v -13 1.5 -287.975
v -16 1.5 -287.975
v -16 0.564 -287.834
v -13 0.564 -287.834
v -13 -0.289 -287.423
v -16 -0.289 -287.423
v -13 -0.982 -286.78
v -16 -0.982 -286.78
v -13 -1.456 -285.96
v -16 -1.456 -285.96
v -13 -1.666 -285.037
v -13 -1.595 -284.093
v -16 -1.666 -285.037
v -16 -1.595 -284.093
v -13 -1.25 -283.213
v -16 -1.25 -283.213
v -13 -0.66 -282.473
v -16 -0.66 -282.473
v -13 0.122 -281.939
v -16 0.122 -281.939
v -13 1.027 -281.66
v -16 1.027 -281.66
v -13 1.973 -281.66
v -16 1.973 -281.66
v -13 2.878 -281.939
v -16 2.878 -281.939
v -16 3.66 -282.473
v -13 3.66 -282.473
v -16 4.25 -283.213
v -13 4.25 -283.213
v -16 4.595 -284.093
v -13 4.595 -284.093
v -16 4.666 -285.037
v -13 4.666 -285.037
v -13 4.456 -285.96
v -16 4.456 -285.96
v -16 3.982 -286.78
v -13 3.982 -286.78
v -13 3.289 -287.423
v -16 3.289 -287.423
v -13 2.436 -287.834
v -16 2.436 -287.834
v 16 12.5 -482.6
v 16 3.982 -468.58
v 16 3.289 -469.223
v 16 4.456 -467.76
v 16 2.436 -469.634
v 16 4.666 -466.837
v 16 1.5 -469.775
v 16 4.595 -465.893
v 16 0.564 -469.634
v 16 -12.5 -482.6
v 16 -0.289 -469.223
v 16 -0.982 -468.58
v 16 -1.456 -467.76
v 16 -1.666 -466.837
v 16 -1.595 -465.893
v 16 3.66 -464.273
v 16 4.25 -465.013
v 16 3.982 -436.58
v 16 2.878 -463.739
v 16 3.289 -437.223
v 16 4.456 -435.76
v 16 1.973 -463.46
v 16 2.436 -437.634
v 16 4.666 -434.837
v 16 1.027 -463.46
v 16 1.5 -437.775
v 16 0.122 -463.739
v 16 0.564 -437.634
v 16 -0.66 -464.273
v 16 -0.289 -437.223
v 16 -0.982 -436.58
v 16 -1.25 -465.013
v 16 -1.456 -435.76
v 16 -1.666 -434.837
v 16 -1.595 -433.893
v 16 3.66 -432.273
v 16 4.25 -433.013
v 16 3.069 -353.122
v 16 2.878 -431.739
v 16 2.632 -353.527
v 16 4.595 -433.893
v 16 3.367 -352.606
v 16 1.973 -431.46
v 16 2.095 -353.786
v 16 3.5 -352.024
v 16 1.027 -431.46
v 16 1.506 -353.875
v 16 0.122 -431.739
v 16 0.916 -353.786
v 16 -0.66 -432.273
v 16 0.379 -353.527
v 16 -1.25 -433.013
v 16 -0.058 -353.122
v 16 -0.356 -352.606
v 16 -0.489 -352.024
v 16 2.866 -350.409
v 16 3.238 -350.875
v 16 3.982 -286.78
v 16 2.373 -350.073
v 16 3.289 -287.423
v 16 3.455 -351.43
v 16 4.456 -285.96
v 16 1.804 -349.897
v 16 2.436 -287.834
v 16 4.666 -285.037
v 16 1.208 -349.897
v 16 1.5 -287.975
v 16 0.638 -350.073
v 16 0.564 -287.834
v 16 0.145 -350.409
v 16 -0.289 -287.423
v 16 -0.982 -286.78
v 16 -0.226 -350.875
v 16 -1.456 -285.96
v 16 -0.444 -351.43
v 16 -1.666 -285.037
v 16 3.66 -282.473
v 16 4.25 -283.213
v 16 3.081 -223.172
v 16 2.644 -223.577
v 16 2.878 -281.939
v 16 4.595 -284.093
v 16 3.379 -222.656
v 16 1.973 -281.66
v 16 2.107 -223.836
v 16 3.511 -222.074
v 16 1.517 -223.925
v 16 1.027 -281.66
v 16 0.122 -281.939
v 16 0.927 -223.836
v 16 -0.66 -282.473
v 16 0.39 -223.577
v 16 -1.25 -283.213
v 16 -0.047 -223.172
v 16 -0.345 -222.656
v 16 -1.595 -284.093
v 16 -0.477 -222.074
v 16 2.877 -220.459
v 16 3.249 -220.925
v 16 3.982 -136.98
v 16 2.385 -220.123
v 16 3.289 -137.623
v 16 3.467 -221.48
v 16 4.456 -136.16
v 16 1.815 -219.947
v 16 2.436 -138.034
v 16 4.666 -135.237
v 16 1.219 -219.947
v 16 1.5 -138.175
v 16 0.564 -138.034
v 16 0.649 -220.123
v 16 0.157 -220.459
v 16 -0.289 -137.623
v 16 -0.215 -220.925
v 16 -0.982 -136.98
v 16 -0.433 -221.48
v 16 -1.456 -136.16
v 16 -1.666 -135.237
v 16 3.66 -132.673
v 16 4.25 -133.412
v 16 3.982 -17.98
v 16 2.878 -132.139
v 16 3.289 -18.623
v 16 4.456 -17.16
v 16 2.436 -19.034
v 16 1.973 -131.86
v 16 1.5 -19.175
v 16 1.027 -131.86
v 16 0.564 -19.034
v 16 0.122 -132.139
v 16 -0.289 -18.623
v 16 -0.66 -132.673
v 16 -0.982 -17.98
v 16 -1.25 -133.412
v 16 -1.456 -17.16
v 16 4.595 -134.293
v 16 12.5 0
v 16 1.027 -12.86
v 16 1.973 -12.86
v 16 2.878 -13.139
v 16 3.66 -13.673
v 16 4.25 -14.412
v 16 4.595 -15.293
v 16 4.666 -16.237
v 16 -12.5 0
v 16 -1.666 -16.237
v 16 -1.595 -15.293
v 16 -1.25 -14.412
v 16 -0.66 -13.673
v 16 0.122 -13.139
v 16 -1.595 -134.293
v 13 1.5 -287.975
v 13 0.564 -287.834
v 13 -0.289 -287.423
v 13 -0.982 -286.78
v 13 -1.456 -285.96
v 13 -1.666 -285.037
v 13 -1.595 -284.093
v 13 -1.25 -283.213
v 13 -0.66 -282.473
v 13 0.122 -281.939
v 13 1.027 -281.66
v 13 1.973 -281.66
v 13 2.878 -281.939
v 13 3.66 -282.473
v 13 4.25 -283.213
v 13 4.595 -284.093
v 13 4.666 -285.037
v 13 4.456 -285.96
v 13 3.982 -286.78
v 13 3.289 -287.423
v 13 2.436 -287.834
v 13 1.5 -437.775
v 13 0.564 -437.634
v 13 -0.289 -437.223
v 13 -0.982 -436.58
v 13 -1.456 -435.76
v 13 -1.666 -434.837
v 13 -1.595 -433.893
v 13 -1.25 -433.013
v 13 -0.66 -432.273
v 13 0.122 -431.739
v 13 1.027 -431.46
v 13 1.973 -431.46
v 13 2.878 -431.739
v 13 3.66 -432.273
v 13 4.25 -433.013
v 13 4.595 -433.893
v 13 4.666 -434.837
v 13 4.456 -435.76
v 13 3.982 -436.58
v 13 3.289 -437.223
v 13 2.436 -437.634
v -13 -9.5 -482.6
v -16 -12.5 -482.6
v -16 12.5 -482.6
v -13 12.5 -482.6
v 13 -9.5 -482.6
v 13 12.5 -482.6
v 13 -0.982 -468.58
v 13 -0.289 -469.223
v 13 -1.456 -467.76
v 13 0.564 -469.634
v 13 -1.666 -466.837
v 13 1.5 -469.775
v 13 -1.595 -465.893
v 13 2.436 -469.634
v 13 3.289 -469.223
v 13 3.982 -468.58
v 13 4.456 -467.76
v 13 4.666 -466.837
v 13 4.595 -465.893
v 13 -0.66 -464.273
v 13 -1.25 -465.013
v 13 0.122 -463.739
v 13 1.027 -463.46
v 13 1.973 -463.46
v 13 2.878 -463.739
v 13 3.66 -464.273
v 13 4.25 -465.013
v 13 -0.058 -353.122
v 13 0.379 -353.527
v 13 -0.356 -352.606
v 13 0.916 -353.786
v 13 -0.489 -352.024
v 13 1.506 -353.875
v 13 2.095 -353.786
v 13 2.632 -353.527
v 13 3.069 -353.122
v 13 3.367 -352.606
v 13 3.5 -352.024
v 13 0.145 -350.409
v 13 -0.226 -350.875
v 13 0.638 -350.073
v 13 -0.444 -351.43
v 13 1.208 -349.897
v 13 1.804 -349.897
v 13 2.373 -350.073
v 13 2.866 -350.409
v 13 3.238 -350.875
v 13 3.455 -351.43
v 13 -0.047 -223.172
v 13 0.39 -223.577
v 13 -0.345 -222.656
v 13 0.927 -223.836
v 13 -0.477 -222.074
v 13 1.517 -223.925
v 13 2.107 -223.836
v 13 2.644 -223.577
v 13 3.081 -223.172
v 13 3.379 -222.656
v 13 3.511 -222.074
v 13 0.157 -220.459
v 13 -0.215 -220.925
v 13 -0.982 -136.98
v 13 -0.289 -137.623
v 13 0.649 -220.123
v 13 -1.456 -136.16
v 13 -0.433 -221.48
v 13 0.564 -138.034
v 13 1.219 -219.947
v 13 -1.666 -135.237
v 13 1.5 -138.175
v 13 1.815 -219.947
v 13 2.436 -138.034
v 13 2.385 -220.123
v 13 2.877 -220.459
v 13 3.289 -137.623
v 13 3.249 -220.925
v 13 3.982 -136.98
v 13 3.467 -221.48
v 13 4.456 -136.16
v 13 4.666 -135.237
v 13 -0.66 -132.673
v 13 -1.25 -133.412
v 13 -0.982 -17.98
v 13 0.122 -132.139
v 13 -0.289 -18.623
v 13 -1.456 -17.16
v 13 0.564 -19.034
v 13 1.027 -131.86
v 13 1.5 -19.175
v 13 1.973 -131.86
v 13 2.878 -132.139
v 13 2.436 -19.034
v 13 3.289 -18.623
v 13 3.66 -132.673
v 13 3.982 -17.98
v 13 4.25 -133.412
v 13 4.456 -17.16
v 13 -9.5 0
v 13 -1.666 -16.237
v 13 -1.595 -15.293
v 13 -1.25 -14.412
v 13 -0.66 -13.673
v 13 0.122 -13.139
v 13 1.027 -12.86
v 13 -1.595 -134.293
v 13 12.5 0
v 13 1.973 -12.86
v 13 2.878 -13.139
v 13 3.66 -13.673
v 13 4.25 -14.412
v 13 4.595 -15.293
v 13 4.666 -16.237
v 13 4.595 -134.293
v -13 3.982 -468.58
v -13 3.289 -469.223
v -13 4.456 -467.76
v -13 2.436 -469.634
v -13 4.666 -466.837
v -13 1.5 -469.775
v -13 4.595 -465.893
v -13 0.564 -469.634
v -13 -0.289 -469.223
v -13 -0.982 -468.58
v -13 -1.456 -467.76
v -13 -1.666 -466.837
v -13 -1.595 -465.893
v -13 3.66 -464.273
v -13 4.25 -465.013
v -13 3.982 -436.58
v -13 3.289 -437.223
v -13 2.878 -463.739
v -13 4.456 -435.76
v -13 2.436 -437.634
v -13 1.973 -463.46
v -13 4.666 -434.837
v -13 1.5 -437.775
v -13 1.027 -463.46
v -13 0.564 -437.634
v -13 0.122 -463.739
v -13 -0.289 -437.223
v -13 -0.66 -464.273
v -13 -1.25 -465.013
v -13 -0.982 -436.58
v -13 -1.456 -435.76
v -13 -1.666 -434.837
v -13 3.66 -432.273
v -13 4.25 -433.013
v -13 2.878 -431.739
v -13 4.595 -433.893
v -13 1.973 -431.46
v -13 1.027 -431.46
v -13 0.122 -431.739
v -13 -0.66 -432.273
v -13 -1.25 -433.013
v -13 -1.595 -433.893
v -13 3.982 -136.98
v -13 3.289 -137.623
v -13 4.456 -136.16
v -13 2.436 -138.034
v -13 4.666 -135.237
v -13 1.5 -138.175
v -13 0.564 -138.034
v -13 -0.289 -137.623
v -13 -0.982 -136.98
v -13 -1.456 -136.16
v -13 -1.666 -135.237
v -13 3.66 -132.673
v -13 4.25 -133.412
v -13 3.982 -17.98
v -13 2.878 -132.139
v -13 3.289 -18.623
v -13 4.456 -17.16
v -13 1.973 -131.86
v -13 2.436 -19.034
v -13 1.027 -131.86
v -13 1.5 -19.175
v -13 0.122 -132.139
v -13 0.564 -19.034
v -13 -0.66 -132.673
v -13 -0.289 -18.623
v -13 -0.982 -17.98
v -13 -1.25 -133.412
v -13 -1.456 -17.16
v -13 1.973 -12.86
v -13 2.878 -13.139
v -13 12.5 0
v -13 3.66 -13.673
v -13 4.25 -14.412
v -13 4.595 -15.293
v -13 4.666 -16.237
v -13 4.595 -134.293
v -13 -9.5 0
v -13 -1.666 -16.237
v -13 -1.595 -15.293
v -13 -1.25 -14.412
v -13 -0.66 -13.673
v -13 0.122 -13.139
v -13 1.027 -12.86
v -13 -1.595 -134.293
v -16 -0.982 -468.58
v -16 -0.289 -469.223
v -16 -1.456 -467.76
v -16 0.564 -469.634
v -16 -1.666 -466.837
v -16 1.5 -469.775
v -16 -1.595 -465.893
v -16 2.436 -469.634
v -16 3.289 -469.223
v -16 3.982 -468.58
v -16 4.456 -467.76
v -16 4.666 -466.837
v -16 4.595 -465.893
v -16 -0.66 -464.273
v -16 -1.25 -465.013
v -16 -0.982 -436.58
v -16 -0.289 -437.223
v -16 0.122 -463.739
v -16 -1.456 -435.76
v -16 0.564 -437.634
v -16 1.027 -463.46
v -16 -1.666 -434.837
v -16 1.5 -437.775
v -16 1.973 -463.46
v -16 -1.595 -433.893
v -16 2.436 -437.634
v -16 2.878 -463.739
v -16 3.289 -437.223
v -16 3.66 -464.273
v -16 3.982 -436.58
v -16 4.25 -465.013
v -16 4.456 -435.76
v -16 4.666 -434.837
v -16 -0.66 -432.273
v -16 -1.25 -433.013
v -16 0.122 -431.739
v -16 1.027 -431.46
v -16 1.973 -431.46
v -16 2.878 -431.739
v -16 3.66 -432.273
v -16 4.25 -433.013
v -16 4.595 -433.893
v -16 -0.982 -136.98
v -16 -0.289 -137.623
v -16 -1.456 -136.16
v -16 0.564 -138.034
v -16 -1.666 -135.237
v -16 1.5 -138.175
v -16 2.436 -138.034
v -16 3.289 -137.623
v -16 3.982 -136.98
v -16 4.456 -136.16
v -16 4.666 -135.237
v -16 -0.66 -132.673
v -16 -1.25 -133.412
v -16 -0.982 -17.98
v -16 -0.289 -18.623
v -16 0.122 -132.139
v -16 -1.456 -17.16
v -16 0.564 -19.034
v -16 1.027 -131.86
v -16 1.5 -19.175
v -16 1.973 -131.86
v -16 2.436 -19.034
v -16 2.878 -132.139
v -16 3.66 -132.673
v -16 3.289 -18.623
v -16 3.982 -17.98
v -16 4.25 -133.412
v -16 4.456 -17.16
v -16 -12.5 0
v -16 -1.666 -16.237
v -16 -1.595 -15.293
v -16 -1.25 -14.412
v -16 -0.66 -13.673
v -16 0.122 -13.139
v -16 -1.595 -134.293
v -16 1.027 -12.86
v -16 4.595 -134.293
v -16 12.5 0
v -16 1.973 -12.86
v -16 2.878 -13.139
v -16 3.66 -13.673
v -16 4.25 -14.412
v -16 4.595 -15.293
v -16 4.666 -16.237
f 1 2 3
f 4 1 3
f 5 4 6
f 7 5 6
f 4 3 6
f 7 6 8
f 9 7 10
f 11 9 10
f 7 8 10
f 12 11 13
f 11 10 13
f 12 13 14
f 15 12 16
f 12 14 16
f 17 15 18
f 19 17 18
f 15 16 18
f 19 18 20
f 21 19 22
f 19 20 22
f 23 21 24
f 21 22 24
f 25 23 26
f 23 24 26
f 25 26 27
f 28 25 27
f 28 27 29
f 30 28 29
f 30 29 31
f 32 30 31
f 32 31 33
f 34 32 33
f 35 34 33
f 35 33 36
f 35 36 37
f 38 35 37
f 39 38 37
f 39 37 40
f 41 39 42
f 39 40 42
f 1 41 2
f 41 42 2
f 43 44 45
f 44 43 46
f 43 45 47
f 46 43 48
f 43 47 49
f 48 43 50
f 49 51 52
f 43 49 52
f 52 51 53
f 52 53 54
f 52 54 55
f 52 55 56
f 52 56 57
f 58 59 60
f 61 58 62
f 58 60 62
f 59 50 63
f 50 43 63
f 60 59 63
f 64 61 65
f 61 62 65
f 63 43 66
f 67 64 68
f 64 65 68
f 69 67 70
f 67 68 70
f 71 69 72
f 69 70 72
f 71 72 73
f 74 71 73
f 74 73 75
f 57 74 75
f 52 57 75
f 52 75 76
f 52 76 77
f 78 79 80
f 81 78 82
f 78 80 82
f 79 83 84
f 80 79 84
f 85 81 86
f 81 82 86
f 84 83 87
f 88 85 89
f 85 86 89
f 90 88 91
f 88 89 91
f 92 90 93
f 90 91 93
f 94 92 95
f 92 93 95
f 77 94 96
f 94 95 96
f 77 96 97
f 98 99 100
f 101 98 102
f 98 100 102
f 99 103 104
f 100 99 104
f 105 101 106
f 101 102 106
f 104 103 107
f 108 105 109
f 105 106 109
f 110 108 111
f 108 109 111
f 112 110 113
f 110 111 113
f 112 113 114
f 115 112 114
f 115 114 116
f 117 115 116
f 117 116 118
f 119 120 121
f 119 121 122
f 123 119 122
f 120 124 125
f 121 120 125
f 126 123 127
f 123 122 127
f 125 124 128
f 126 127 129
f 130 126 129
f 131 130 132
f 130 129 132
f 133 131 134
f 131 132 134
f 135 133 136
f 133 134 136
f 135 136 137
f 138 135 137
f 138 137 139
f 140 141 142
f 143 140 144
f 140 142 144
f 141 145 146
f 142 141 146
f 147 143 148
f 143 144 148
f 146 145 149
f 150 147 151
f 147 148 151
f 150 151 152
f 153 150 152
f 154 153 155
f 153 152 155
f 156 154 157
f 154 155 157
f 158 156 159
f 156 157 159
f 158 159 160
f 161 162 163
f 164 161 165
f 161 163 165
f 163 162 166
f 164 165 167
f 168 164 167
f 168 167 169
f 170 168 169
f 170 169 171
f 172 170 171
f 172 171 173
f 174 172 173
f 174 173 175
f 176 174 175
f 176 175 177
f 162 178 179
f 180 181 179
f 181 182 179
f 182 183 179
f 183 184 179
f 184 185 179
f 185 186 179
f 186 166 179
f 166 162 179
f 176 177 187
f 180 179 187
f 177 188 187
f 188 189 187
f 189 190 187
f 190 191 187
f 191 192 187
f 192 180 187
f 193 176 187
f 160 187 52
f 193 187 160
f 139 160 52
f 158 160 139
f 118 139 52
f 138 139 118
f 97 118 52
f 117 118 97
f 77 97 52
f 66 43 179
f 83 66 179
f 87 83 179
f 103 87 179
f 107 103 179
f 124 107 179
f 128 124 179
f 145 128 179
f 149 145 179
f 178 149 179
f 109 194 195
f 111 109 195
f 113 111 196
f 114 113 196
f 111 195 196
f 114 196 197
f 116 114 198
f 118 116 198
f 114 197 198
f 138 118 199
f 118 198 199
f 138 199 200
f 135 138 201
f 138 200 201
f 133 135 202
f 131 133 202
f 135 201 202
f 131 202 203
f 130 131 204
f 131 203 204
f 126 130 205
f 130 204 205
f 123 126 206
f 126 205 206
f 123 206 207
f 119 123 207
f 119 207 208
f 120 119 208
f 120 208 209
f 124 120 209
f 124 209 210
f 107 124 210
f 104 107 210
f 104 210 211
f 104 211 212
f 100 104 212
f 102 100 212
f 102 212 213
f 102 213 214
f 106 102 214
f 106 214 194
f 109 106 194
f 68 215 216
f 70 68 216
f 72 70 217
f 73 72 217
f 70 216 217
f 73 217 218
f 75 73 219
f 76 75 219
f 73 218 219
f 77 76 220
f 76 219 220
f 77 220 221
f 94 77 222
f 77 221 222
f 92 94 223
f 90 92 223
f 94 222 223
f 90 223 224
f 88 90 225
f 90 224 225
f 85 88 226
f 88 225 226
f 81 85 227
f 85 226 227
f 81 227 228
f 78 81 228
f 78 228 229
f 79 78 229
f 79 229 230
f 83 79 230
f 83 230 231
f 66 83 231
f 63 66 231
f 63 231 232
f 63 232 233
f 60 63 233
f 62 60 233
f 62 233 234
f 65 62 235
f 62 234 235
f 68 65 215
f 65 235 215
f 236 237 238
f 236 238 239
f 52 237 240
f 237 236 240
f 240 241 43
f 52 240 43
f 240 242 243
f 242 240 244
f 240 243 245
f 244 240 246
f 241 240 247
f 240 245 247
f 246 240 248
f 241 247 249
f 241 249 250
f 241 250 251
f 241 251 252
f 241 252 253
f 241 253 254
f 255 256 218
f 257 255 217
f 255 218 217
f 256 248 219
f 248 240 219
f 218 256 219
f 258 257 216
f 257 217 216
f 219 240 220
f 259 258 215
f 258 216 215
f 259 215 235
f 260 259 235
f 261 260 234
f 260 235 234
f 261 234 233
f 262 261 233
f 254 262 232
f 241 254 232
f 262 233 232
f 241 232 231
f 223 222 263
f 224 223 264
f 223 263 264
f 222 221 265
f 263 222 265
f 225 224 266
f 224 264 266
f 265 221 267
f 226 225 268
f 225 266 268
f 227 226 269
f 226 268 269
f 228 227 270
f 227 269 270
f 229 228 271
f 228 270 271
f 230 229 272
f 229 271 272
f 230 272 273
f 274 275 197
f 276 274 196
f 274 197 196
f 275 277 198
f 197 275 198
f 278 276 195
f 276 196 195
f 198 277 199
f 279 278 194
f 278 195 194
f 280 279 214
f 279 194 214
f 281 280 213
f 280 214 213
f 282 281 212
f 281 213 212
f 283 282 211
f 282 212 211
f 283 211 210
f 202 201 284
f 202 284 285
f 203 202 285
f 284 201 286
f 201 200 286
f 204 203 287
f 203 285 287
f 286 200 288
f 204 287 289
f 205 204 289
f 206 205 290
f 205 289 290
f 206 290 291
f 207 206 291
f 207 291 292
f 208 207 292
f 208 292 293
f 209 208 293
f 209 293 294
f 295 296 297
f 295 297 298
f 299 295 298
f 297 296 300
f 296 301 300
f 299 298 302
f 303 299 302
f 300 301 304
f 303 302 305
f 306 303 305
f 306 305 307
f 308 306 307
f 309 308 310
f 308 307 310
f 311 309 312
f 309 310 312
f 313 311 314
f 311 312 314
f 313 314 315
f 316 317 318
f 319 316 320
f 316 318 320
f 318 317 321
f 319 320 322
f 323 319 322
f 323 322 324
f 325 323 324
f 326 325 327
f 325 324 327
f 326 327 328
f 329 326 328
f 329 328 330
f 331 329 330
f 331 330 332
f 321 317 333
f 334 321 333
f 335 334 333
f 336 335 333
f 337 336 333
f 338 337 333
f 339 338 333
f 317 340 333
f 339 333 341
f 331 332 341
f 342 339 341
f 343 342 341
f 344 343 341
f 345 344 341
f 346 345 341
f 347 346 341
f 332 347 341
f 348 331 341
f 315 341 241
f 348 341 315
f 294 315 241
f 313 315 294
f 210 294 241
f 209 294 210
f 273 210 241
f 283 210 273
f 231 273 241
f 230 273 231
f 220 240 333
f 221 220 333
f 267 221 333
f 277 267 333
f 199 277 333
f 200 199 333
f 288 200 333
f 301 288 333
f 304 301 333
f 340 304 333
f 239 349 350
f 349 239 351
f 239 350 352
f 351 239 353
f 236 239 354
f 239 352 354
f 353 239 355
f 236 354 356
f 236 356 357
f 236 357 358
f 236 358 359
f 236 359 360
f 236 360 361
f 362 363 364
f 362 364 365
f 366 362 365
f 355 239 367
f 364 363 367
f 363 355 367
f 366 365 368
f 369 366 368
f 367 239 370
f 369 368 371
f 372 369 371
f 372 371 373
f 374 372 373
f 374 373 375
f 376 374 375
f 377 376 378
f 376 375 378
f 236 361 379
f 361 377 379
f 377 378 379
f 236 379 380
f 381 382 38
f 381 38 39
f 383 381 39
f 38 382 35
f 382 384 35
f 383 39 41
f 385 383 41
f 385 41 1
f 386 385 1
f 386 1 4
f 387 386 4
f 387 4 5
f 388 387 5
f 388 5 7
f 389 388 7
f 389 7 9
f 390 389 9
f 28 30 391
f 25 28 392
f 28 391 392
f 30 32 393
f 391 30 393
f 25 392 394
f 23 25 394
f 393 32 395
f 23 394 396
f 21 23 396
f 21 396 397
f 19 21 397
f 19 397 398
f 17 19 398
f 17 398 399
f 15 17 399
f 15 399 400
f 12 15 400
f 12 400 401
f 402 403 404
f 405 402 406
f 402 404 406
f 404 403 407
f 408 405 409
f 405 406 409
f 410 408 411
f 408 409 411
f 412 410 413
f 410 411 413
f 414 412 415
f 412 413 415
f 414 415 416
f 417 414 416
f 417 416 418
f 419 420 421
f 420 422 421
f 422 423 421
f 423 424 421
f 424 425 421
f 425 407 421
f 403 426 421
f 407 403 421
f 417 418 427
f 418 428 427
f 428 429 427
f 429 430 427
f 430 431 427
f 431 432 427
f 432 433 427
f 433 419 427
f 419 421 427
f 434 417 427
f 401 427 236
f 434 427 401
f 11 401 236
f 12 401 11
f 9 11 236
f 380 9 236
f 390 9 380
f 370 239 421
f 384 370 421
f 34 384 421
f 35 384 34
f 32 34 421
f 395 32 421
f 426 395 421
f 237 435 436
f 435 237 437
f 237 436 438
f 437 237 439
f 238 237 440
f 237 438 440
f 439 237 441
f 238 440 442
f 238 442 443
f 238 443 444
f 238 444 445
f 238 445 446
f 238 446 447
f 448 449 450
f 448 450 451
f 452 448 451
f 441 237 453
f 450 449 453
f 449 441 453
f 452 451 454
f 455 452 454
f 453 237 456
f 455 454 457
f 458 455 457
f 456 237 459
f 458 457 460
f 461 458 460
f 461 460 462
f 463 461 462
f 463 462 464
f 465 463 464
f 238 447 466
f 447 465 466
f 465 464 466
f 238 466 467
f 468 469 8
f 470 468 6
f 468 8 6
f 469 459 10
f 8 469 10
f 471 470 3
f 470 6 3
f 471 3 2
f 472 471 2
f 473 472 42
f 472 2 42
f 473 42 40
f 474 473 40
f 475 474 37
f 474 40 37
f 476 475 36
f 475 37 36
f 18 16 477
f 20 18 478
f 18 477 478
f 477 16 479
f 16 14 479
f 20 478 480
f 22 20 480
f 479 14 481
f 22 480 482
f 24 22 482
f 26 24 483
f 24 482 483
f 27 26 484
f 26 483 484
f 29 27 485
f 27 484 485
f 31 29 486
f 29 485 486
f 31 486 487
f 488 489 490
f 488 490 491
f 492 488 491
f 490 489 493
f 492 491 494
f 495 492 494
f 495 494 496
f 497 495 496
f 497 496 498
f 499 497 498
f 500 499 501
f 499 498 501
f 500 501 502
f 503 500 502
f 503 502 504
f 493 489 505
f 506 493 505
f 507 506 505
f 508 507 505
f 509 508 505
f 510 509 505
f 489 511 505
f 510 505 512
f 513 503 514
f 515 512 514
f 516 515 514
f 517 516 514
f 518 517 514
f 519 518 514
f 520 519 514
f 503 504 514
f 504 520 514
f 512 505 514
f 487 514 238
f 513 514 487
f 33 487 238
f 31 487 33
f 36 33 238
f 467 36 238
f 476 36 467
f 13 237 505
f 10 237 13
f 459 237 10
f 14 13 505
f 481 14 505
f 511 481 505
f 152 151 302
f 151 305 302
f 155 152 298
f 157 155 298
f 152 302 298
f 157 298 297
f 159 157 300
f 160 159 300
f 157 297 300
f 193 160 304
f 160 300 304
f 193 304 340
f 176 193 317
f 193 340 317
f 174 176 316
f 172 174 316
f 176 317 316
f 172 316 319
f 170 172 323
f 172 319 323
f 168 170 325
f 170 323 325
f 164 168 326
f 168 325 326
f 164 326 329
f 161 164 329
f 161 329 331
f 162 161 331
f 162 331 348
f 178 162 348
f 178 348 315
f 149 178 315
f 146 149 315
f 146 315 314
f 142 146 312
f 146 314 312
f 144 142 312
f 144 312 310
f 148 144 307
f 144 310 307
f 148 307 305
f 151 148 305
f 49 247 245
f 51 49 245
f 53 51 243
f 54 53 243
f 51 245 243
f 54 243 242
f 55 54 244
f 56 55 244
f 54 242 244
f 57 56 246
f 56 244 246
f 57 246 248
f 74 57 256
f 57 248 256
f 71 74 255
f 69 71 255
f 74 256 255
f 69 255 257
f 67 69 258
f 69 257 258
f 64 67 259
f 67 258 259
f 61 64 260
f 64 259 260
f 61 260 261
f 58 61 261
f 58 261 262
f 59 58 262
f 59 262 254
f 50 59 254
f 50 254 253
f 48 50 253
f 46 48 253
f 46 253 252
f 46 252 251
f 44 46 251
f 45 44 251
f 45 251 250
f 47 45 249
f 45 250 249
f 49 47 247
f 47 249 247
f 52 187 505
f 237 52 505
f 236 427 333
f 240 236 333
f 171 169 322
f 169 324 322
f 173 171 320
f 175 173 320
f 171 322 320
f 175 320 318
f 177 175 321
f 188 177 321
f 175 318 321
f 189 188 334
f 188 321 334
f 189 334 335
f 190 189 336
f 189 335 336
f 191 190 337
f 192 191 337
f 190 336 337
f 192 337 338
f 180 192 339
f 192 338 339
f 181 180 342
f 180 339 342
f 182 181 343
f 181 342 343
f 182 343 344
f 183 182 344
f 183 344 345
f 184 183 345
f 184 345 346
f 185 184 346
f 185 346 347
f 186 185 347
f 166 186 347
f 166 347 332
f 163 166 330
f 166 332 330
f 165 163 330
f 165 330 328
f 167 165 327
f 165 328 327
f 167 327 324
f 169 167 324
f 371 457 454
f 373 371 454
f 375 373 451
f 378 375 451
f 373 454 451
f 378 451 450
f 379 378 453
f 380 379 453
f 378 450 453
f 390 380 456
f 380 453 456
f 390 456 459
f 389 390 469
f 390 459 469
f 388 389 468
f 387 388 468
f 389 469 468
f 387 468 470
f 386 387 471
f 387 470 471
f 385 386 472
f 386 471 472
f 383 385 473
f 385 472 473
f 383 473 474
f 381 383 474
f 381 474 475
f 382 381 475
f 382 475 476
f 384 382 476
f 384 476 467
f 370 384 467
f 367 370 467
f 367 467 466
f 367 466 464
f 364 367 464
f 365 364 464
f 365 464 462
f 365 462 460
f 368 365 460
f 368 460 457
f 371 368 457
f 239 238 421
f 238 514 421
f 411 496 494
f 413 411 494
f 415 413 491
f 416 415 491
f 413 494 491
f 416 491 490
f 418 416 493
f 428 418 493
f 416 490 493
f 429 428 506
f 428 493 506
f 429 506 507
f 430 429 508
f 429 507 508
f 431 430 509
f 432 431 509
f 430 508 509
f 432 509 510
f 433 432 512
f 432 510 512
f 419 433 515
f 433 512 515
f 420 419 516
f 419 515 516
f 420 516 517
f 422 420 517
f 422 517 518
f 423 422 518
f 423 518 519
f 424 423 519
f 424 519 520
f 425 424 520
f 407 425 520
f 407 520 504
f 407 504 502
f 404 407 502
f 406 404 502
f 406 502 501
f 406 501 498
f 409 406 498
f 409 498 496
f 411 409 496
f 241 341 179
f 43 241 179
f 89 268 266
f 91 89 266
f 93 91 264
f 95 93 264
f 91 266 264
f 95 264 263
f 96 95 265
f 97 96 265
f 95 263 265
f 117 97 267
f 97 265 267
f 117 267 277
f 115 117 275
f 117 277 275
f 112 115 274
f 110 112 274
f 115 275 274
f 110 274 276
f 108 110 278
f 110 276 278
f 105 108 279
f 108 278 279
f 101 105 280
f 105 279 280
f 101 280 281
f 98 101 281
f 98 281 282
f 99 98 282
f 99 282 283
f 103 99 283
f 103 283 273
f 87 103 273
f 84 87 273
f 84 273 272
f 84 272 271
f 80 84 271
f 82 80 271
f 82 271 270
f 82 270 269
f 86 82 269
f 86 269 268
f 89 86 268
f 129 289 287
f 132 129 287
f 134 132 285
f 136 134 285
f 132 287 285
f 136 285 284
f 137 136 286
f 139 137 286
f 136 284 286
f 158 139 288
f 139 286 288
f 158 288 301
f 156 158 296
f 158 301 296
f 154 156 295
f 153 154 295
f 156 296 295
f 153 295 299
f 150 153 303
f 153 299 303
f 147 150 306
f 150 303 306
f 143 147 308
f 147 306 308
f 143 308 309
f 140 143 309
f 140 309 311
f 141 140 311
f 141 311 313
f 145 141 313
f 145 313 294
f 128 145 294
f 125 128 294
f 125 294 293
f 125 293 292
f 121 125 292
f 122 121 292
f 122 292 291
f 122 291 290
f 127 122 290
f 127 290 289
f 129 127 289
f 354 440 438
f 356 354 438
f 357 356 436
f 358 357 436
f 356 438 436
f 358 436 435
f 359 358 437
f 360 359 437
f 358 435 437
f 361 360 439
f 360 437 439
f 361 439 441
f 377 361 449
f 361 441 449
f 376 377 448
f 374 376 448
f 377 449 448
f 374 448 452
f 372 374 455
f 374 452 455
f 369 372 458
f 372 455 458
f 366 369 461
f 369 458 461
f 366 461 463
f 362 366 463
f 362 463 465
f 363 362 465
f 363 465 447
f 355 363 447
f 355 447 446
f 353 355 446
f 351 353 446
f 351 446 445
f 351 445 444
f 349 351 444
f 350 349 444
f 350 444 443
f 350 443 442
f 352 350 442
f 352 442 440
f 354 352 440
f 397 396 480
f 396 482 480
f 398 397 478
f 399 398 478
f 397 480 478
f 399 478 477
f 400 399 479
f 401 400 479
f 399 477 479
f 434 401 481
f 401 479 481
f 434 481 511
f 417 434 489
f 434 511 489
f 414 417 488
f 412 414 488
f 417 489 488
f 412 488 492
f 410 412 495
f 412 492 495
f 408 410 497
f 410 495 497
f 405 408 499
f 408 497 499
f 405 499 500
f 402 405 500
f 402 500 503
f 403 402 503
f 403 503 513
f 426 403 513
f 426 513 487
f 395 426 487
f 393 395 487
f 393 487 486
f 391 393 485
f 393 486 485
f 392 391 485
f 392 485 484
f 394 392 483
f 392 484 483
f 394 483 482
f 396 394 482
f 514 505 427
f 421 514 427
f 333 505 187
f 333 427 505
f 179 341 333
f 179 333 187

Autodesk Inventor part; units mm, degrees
ref_plane "YZ Plane" through (0, 0, 0) normal (1, 0, 0) x (0, 1, 0)
ref_plane "XZ Plane" through (0, 0, 0) normal (0, 1, 0) x (-1, 0, 0)
ref_plane "XY Plane" through (0, 0, 0) normal (0, 0, 1) x (1, 0, 0)
sketch "Sketch1" plane through (0, 0, 0) normal (0, 0, 1) x (1, 0, 0)
  line L0 (-16, 12.5) -> (-13, 12.5)
  line L1 (-13, 12.5) -> (-13, -9.5)
  line L2 (-13, -9.5) -> (13, -9.5)
  line L3 (13, -9.5) -> (13, 12.5)
  line L4 (13, 12.5) -> (16, 12.5)
  line L5 (16, 12.5) -> (16, -12.5)
  line L6 (16, -12.5) -> (-16, -12.5)
  line L7 (-16, -12.5) -> (-16, 12.5)
  point P0 (0, 0)
  dimension "d0" = 3
  dimension "d2" = 3
  dimension "d3" = 25
  dimension "d4" = 32
  dimension "d5" = 16
  dimension "d7" = 12.5
  dimension "d8" = 3
  dimension "d53" = 25
extrude "Extrusion1" add sketch "Sketch1" against normal blind 482.6
sketch "Sketch12" plane through (16, -12.5, 0) normal (1, 0, 0) x (0, 0, -1)
  circle A0 centre (16, 14) radius 3.175 projected
  circle A1 centre (16, 14) radius 3.175
  circle A2 centre (466.6, 14) radius 3.175 projected
  circle A3 centre (466.6, 14) radius 3.175
  circle A4 centre (135, 14) radius 3.175 projected
  circle A5 centre (135, 14) radius 3.175
  circle A6 centre (434.6, 14) radius 3.175 projected
  circle A7 centre (284.8, 14) radius 3.175 projected
  point P0 (0, 12.5)
hole "Hole2" at (16, 1.5, -16) at (16, 1.5, -466.6) at (16, 1.5, -135) at (16, 1.5, -434.6) at (16, 1.5, -284.8) direction (-1, 0, 0) diameter 6.35 end through all
sketch "Sketch13" plane through (16, -12.5, 0) normal (1, 0, 0) x (0, 0, -1)
  circle A0 centre (351.875, 14.0056) radius 2 projected
  circle A1 centre (221.9249, 14.017) radius 2 projected
  point P0 (0, 12.5)
hole "Hole3" at (16, 1.5056, -351.875) at (16, 1.517, -221.9249) direction (-1, 0, 0) diameter 4 depth 3 tip angle 118
equation "\"d2\" = d0"
equation "\"d5\" = 0.5 * d4"
equation "\"d7\" = 0.5 * d3"
equation "\"d8\" = d0"
equation "\"d53\" = d3"
properties part number "18in C-Channel Front" material "Aluminum 6061"
